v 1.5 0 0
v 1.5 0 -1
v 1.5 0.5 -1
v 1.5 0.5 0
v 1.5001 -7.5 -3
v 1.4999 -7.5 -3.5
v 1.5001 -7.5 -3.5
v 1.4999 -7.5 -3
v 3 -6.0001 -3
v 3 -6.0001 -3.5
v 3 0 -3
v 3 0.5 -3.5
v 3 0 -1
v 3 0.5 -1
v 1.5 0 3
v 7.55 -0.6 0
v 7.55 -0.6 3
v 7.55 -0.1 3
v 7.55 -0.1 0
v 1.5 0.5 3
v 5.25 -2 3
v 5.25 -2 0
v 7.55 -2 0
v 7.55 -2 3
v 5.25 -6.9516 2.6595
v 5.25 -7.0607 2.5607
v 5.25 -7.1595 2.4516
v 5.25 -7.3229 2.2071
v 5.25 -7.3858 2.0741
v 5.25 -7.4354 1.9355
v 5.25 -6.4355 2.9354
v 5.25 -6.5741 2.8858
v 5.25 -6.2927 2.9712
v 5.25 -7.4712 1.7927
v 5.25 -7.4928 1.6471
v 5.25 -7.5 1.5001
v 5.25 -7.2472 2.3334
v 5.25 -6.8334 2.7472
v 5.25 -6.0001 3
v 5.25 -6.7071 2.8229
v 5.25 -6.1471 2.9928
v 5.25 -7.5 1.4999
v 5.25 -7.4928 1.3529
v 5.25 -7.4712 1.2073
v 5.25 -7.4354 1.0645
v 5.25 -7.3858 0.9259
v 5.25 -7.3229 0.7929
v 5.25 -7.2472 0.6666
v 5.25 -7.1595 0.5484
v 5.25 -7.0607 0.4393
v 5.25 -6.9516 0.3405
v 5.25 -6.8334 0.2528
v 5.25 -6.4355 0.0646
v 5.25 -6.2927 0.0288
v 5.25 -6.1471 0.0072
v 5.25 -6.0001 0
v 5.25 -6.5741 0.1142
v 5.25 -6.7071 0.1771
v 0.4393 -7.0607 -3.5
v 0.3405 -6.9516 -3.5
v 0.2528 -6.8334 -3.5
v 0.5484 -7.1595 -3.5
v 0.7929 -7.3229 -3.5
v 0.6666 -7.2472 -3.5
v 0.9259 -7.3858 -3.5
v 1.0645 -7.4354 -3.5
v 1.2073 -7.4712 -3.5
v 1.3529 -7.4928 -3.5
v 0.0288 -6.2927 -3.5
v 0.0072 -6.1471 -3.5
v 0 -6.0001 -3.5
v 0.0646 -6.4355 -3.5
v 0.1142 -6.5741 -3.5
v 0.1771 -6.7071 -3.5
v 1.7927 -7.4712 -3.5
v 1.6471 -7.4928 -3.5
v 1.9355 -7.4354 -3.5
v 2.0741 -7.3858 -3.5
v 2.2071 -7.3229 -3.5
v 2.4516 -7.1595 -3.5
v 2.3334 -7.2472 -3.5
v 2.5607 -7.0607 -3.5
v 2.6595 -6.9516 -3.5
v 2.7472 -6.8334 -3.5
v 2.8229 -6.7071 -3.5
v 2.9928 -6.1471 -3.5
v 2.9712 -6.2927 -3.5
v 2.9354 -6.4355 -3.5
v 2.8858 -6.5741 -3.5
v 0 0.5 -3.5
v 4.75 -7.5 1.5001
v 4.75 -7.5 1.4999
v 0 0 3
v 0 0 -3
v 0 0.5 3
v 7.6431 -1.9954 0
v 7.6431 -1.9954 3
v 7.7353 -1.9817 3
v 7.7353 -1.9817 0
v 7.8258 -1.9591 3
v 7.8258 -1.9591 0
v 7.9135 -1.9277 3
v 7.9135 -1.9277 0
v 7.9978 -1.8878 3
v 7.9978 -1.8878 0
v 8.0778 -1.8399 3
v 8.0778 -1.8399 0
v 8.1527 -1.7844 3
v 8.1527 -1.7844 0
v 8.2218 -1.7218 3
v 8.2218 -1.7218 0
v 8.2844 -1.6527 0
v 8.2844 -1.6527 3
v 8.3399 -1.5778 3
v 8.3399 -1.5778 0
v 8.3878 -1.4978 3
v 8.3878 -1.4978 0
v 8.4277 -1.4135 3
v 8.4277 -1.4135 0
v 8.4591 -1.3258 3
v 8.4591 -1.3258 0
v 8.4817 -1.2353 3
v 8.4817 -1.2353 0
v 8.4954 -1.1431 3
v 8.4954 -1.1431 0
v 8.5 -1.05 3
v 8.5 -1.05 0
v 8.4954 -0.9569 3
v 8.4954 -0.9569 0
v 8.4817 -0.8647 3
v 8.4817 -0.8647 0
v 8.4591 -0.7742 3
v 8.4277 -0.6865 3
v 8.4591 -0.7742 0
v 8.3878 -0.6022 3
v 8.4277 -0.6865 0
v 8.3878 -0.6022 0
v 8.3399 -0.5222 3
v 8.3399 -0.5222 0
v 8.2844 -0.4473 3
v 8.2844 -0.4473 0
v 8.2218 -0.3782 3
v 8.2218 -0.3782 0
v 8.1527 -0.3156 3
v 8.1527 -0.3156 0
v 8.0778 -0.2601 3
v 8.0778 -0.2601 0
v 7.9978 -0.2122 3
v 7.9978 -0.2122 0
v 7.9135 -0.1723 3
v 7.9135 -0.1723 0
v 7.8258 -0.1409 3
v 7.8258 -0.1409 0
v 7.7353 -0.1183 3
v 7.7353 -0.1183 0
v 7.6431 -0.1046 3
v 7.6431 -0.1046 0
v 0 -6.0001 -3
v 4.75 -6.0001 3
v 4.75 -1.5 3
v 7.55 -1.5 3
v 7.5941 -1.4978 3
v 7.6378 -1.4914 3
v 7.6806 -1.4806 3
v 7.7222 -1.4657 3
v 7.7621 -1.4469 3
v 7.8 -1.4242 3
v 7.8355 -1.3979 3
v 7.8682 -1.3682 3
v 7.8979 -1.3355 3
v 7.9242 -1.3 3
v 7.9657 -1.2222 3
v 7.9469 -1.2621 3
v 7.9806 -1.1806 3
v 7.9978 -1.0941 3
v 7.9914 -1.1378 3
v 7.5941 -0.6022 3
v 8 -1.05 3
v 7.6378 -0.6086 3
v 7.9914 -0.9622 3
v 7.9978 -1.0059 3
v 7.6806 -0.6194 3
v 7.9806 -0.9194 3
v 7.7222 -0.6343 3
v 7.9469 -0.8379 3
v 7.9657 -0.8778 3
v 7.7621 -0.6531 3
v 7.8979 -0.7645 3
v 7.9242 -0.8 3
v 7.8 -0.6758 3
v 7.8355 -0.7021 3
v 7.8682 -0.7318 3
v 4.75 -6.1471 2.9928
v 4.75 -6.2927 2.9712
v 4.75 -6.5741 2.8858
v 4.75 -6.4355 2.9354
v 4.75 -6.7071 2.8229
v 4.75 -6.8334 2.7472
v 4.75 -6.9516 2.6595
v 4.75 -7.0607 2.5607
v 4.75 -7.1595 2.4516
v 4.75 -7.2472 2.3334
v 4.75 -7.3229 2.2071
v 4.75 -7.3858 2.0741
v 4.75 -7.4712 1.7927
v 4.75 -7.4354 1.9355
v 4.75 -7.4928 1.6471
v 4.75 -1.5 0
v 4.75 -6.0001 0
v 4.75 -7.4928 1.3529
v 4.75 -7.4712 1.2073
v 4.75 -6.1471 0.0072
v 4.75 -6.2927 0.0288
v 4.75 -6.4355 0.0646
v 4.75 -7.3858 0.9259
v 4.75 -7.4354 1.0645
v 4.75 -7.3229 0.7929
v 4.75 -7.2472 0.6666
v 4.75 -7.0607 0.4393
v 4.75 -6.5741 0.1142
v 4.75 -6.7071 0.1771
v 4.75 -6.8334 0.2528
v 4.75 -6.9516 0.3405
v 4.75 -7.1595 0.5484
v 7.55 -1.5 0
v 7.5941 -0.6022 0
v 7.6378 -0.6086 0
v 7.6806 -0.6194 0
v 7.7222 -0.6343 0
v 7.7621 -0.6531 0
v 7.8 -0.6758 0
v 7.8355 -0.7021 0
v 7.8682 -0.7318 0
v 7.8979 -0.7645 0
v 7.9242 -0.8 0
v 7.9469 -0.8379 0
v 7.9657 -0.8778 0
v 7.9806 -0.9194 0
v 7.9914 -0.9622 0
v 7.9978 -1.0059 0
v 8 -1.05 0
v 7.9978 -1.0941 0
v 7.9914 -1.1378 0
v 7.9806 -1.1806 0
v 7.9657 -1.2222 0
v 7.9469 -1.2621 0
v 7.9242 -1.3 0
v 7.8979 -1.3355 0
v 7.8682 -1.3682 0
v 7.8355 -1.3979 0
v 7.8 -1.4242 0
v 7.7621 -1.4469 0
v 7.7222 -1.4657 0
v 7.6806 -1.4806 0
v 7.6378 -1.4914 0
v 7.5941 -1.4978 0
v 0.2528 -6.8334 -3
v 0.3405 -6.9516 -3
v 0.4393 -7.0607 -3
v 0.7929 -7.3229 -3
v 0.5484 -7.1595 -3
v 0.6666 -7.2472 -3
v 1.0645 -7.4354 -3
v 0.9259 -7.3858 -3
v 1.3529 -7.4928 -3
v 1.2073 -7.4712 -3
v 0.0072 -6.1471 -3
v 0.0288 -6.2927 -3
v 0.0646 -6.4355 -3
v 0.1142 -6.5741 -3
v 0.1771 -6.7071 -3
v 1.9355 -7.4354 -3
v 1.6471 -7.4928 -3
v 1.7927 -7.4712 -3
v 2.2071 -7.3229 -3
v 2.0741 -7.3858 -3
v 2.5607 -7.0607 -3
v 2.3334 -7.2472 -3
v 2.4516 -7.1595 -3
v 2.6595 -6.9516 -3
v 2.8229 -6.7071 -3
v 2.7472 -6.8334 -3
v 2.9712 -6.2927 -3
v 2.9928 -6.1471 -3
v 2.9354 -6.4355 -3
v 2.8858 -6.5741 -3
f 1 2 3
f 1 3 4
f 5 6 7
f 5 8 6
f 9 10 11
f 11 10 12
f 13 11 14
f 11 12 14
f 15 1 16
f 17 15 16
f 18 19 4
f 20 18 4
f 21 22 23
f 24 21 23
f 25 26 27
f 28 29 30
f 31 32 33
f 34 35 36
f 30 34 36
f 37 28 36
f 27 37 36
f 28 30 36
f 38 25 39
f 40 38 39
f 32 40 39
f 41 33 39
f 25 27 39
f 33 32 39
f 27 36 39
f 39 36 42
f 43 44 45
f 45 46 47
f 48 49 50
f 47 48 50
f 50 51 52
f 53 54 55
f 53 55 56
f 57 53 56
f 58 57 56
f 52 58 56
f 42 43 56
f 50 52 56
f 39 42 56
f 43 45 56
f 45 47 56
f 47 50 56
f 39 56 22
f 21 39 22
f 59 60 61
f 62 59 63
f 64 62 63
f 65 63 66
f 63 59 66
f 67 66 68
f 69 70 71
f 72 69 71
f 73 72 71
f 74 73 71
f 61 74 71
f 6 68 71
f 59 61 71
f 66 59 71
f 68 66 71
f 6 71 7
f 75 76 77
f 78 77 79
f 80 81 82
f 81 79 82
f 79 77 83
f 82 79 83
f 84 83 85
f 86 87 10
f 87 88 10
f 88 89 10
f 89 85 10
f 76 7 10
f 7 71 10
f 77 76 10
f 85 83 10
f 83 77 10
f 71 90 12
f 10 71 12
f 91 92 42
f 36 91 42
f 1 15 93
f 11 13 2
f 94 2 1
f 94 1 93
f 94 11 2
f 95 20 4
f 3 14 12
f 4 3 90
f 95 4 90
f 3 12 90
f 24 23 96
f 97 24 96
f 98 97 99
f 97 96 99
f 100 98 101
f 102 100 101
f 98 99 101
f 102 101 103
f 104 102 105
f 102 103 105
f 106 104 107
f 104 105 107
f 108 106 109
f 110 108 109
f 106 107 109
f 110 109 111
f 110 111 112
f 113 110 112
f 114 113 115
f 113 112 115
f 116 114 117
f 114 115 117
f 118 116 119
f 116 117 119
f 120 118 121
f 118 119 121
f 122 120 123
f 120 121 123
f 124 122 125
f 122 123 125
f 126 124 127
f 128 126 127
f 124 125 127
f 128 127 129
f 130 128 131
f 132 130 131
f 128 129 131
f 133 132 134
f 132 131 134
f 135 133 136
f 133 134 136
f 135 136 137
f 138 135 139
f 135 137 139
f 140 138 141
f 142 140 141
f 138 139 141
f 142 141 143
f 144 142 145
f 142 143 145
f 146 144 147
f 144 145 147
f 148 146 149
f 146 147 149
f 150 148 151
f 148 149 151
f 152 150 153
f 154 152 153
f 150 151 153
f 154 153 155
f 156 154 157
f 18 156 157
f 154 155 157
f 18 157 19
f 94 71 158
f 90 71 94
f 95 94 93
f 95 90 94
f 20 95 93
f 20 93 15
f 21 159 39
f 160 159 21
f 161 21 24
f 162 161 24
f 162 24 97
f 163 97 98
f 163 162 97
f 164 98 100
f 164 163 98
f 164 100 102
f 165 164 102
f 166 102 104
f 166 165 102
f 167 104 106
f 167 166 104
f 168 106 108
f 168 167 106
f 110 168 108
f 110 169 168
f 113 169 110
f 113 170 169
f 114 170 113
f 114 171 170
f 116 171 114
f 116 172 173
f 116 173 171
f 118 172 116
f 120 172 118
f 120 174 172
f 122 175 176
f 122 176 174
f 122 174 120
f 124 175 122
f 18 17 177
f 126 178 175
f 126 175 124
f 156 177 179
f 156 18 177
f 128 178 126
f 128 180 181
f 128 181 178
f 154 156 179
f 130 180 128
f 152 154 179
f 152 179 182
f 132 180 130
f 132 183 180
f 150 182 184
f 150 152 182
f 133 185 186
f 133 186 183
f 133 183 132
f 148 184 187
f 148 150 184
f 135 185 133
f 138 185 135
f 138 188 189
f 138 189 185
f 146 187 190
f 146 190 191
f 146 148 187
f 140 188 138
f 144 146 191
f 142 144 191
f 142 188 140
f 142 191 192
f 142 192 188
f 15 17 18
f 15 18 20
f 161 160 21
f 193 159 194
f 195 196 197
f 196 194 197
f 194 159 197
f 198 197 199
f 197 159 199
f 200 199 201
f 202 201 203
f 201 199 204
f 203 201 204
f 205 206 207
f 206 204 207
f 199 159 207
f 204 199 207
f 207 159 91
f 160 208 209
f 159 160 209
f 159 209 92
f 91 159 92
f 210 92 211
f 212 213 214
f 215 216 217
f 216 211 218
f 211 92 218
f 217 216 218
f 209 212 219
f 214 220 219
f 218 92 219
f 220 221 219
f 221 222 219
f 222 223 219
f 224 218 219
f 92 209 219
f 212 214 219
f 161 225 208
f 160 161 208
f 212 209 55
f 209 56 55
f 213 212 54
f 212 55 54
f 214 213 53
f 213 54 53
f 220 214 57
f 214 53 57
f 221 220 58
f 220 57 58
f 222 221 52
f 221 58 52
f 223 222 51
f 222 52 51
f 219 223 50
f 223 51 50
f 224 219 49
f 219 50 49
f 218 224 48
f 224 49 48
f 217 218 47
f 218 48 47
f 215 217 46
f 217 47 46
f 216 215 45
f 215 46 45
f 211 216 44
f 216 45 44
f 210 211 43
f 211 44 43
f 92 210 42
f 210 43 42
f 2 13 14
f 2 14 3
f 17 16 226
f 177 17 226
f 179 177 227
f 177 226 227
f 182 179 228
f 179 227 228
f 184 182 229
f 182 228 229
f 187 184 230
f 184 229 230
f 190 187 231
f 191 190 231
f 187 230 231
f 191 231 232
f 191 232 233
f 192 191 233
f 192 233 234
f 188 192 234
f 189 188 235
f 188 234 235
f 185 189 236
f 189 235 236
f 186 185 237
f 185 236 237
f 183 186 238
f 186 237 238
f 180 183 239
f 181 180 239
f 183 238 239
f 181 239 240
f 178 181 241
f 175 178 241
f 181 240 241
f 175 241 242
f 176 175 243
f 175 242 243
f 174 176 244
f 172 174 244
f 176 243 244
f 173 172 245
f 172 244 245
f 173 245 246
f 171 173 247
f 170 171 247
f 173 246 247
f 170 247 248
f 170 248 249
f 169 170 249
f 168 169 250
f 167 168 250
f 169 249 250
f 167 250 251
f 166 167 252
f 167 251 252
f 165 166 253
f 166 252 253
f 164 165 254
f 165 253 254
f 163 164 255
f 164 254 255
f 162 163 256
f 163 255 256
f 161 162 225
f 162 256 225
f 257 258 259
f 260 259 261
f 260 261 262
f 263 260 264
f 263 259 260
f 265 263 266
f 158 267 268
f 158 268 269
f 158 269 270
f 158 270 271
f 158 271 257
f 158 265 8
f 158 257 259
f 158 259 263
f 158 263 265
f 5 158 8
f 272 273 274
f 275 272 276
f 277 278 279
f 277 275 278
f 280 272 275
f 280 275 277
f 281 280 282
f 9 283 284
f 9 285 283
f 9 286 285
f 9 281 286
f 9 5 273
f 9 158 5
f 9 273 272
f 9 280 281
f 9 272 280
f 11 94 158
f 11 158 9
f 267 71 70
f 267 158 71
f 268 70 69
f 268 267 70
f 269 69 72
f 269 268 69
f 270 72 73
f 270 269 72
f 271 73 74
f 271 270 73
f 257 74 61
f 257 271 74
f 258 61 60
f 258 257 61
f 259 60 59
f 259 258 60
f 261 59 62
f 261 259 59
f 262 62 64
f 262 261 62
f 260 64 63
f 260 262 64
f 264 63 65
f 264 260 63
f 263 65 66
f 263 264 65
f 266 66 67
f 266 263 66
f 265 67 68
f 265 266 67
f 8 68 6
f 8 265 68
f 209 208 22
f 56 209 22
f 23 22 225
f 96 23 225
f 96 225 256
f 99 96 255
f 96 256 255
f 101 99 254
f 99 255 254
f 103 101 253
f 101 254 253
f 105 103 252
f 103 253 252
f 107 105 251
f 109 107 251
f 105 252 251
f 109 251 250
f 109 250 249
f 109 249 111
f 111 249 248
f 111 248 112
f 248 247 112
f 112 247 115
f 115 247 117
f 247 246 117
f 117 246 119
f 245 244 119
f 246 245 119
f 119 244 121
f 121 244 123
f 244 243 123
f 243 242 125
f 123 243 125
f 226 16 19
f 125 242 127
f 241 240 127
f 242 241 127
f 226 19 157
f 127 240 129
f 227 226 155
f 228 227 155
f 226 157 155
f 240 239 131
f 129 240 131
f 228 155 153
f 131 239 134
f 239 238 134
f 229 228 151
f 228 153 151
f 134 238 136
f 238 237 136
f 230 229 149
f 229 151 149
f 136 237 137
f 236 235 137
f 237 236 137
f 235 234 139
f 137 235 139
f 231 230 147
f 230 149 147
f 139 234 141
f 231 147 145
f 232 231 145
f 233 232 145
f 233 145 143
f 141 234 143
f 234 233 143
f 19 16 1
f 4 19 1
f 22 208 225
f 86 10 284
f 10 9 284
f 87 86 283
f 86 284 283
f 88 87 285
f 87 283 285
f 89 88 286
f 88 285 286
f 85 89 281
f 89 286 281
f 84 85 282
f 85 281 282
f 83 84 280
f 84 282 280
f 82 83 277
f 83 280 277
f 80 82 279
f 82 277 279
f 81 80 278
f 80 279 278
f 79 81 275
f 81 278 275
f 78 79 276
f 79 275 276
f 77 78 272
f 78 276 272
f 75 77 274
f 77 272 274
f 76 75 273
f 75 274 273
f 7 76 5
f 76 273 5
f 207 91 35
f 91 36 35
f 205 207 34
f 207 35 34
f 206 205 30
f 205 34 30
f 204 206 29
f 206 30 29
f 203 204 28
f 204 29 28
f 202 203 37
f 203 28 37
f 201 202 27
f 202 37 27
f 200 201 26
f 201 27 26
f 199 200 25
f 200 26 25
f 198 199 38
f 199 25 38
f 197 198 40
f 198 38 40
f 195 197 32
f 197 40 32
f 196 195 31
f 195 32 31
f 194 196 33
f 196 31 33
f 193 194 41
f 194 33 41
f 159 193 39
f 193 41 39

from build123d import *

# Parameters (mm, degrees)
BOSS_EXTRUDE1_DEPTH = 3
BOSS_EXTRUDE3_DEPTH = 0.5
SKETCH4_W           = 3
SKETCH4_H           = 0.5
BOSS_EXTRUDE5_DEPTH = 7.5
FILLET1_R           = 1.5


with BuildPart() as part:
    # Sketch1 → Boss-Extrude1 (new body)
    with BuildSketch(Plane.XY):
        with BuildLine():
            Line((0, 0), (1.5, 0))
            Line((1.5, 0), (7.55, -0.6))
            ThreePointArc((7.55, -0.6), (8, -1.05), (7.55, -1.5))
            Line((7.55, -1.5), (4.75, -1.5))
            Line((4.75, -1.5), (4.75, -7.5))
            Line((4.75, -7.5), (5.25, -7.5))
            Line((5.25, -7.5), (5.25, -2))
            Line((5.25, -2), (7.55, -2))
            ThreePointArc((7.55, -2), (8.5, -1.05), (7.55, -0.1))
            Line((7.55, -0.1), (1.5, 0.5))
            Line((1.5, 0.5), (0, 0.5))
            Line((0, 0.5), (0, 0))
        make_face()
    extrude(amount=BOSS_EXTRUDE1_DEPTH)

    # Sketch3 → Boss-Extrude3 (add)
    with BuildSketch(Plane(origin=(0, 0, 0), x_dir=(-1, 0, 0), z_dir=(0, -1, 0))):
        Polygon((-3, 1), (-1.5, 1), (-1.5, 0), (0, 0), (0, 3.5), (-3, 3.5), align=None)
    extrude(amount=-BOSS_EXTRUDE3_DEPTH)

    # Sketch4 → Boss-Extrude5 (add)
    with BuildSketch(Plane.XZ):
        with Locations((1.5, -3.25)):
            Rectangle(SKETCH4_W, SKETCH4_H)
    extrude(amount=BOSS_EXTRUDE5_DEPTH)

    # Fillet1
    fillet1_edges = [part.edges().sort_by_distance(p)[0] for p in [
        (0, -7.5, -3.25),
        (3, -7.5, -3.25),
        (5, -7.5, 3),
        (5, -7.5, 0),
    ]]
    fillet(fillet1_edges, radius=FILLET1_R - 0.0001)  # a hair under: the kernel refuses the full size


solid = part.part
